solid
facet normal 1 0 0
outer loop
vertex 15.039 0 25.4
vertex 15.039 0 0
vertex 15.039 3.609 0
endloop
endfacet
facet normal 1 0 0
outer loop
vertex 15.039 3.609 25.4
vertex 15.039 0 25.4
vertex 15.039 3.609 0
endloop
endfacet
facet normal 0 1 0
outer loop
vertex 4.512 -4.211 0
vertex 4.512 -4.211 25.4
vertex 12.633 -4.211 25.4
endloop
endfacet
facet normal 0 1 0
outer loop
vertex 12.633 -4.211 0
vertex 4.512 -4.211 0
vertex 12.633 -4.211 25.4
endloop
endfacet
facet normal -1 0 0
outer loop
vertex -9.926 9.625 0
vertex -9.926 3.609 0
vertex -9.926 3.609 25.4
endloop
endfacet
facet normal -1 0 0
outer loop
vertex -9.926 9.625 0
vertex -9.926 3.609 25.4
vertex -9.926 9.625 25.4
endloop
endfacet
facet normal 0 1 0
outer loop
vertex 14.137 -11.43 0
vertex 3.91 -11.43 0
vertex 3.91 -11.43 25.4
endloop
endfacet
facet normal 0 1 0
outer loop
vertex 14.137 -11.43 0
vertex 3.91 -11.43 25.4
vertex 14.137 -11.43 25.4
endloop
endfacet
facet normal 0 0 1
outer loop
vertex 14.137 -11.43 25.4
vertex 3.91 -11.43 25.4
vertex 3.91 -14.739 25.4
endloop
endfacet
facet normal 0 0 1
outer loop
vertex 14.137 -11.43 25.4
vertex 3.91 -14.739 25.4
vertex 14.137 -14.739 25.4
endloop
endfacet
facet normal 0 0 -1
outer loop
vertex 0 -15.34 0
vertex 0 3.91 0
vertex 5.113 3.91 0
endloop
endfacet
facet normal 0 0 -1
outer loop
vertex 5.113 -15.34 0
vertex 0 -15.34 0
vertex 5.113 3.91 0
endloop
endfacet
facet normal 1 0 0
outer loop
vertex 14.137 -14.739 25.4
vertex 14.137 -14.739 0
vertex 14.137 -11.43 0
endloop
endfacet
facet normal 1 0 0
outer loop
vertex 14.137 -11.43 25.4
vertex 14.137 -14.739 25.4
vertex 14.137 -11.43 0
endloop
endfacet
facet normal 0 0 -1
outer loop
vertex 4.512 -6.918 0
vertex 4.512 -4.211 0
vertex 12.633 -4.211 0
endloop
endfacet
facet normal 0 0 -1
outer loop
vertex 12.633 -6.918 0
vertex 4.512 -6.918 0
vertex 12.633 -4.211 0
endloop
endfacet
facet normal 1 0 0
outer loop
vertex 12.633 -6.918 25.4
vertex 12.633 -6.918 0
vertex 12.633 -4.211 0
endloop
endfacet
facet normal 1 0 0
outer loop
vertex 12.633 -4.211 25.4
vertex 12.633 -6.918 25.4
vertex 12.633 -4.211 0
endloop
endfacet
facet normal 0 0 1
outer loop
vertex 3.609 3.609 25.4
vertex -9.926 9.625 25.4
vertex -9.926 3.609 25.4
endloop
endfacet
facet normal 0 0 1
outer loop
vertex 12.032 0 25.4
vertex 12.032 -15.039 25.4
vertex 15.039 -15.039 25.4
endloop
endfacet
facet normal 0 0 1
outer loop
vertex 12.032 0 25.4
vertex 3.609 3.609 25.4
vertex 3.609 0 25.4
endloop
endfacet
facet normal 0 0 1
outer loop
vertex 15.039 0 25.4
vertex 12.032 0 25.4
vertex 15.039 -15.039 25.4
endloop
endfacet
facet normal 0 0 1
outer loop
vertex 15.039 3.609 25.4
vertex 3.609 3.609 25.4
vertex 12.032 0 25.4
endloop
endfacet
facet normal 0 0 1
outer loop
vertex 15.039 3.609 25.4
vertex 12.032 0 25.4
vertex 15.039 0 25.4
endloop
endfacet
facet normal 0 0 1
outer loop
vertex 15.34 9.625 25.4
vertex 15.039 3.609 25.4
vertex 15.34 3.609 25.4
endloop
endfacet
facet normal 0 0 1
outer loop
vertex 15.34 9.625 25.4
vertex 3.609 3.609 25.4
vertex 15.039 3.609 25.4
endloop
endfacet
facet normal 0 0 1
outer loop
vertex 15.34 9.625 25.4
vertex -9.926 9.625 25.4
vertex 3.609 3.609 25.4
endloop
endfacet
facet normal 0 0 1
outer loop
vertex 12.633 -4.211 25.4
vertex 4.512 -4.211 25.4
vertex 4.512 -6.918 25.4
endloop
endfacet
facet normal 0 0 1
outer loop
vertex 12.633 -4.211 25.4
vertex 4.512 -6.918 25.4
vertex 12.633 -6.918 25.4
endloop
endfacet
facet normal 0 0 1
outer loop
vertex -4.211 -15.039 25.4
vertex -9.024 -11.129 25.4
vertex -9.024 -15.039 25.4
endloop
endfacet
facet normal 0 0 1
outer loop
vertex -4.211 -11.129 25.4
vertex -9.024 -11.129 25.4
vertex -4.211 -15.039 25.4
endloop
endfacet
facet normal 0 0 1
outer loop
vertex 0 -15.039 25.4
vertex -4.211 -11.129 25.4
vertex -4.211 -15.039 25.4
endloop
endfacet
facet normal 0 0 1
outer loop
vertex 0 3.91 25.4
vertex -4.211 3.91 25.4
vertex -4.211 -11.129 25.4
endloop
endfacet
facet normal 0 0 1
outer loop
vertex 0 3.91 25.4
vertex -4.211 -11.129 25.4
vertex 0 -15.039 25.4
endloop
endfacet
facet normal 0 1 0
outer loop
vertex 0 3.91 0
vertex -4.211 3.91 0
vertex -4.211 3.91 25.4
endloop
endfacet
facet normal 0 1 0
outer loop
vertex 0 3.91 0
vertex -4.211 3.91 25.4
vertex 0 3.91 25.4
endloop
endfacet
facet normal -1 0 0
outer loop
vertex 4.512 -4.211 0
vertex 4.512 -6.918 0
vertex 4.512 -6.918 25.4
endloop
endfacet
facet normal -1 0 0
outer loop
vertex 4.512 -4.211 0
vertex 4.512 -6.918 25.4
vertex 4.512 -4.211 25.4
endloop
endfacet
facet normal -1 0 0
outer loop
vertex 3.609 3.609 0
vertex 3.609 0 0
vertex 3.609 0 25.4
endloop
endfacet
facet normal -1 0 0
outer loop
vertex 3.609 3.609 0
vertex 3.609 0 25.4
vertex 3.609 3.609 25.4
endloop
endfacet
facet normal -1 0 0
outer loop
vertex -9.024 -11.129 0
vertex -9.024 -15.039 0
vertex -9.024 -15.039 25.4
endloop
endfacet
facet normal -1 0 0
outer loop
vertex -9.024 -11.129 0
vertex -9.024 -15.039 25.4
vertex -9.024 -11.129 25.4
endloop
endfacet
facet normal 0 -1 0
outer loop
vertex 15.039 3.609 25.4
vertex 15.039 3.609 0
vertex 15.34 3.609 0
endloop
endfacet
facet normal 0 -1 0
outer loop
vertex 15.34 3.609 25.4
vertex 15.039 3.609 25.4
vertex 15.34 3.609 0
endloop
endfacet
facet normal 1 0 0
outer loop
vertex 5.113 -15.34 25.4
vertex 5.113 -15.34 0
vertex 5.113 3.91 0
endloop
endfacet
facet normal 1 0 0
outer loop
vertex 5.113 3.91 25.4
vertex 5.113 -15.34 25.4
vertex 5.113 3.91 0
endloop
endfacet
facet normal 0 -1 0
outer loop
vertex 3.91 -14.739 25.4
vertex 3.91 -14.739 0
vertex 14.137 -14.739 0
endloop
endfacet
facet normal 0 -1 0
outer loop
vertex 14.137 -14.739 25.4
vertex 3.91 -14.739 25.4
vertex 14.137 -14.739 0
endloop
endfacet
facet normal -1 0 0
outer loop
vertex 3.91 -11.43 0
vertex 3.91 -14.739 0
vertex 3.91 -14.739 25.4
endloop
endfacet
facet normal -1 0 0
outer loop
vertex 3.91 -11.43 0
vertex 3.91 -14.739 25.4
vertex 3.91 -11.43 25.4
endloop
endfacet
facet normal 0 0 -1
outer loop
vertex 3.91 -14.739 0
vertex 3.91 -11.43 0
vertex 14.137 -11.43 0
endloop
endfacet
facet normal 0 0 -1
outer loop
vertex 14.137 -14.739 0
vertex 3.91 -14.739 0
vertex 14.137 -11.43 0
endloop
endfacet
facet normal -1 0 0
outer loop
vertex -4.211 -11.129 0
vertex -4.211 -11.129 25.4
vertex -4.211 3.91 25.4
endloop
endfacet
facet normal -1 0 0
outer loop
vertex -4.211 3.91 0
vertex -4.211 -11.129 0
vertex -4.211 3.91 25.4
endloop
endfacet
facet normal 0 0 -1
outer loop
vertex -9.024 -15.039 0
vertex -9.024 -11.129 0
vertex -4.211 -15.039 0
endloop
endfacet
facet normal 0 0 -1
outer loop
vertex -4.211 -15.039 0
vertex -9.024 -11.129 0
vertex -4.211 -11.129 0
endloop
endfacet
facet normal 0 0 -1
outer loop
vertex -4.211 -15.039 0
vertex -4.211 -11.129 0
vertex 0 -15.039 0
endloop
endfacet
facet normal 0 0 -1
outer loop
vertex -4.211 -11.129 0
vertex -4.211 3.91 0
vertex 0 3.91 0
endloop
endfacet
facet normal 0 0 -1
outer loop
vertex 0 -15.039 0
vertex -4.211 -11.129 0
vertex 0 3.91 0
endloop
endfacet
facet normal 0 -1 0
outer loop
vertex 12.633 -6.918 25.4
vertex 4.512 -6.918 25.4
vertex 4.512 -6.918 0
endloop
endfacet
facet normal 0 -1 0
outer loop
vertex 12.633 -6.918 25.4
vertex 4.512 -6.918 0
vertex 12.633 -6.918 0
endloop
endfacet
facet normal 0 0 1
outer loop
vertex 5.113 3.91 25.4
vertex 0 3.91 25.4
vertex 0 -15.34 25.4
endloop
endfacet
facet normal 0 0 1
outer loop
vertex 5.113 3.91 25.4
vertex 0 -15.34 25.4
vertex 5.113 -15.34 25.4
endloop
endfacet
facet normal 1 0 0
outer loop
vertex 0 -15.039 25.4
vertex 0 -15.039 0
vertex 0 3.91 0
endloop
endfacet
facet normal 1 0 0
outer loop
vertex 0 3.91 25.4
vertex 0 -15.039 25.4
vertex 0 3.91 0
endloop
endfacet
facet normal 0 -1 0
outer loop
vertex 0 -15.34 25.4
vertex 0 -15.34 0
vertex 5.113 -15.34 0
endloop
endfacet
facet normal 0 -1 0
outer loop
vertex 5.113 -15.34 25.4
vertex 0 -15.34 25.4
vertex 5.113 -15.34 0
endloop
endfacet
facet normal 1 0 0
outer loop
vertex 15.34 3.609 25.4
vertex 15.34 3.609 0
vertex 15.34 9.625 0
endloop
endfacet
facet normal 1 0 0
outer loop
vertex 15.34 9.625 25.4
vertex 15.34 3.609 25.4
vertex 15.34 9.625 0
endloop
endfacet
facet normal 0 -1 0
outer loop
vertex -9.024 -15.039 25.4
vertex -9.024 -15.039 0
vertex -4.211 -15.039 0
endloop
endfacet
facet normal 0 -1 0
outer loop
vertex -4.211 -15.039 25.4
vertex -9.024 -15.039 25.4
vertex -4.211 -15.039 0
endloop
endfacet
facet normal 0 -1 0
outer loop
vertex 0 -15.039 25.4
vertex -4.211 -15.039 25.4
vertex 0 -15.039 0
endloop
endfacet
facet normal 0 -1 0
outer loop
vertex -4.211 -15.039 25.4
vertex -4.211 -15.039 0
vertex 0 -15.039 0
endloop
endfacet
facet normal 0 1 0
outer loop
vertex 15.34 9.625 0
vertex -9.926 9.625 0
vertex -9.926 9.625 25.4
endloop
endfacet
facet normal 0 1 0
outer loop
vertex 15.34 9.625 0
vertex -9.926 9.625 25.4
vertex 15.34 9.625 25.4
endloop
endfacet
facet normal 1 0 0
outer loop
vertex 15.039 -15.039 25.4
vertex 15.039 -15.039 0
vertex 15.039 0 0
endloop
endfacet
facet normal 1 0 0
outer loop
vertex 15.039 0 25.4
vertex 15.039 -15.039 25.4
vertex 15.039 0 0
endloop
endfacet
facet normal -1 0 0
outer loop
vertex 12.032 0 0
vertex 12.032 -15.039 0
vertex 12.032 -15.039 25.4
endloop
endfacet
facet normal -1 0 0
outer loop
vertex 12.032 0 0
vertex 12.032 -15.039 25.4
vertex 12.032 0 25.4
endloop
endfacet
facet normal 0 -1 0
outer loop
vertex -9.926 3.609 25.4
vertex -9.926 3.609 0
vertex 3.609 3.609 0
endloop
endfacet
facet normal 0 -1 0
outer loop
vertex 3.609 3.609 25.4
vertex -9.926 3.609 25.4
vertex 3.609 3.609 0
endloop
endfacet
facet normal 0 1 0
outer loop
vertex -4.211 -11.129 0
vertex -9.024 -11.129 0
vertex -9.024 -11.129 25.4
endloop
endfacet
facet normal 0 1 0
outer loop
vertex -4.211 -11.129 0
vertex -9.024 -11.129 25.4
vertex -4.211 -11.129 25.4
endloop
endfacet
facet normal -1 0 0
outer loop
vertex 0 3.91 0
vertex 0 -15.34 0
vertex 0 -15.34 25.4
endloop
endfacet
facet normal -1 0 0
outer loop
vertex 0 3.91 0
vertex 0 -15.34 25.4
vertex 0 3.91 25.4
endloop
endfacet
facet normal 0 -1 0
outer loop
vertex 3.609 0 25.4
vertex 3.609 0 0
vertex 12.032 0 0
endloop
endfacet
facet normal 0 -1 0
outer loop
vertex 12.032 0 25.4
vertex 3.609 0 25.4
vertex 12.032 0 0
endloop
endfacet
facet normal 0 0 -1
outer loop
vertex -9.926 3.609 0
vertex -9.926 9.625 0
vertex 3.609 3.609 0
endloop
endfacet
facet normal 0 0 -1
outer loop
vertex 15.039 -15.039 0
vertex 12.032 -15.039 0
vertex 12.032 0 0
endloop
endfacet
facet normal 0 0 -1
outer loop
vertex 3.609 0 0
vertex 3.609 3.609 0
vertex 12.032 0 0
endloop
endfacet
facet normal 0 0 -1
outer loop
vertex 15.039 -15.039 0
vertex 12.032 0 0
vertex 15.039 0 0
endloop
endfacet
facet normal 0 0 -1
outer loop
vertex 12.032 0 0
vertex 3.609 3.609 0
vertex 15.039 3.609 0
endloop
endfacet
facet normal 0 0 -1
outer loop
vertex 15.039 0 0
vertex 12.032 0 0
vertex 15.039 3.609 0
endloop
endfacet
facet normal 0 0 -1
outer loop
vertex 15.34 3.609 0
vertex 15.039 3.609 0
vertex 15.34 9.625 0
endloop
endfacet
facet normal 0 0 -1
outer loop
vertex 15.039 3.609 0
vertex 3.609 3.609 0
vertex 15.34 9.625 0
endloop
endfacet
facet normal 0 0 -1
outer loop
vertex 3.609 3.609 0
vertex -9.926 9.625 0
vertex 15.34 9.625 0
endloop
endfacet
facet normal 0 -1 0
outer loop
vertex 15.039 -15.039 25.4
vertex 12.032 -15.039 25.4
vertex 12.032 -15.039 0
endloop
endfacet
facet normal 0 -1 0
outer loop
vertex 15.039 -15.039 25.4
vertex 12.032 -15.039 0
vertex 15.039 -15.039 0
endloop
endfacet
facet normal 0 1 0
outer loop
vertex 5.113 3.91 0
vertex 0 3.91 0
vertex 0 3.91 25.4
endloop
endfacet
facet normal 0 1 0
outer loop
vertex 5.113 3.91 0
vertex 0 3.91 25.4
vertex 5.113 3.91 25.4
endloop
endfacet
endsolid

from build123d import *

# Parameters (mm, degrees)
F1_W      = 25.2663176507
F1_H      = 6.0157899279
F2_DEPTH  = 25.4
F3_W      = 4.2110527866
F3_H      = 18.949736841
F4_DEPTH  = 25.4
F5_W      = 9.0236850083
F5_H      = 3.9102621377
F6_DEPTH  = 25.4
F7_W      = 5.1134219393
F7_H      = 19.2505251616
F8_DEPTH  = 25.4
F9_W      = 11.4300006535
F9_H      = 3.6094735842
F10_DEPTH = 25.4
F11_W     = 3.0078934506
F11_H     = 18.3481578715
F12_DEPTH = 25.4
F13_W     = 8.1213139929
F13_H     = 2.70710513
F14_DEPTH = 25.4
F15_W     = 10.2268396877
F15_H     = 3.3086827025
F16_DEPTH = 25.4


with BuildPart() as f2:
    # F1 (on face) → F2 (new body)
    with BuildSketch(Plane.XY):
        with Locations((2.7071060613, 6.6173685482)):
            Rectangle(F1_W, F1_H)
    extrude(amount=F2_DEPTH)

    # F9 (on face) → F10 (join)
    with BuildSketch(Plane.XY):
        with Locations((9.3244753079, 1.8047367921)):
            Rectangle(F9_W, F9_H)
    extrude(amount=F10_DEPTH)

    # F11 (on face) → F12 (join)
    with BuildSketch(Plane.XY):
        with Locations((13.5355251841, -5.8653948363)):
            Rectangle(F11_W, F11_H)
    extrude(amount=F12_DEPTH)


with BuildPart() as f4:
    # F3 (on face) → F4 (new body)
    with BuildSketch(Plane.XY):
        with Locations((-2.1055263933, -5.5646053515)):
            Rectangle(F3_W, F3_H)
    extrude(amount=F4_DEPTH)

    # F5 (on face) → F6 (join)
    with BuildSketch(Plane.XY):
        with Locations((-4.5118425041, -13.0843427032)):
            Rectangle(F5_W, F5_H)
    extrude(amount=F6_DEPTH)


with BuildPart() as f8:
    # F7 (on face) → F8 (new body)
    with BuildSketch(Plane.XY):
        with Locations((2.5567109697, -5.7149995118)):
            Rectangle(F7_W, F7_H)
    extrude(amount=F8_DEPTH)


with BuildPart() as f14:
    # F13 (on face) → F14 (new body)
    with BuildSketch(Plane.XY):
        with Locations((8.5724999662, -5.5646053515)):
            Rectangle(F13_W, F13_H)
    extrude(amount=F14_DEPTH)


with BuildPart() as f16:
    # F15 (on face) → F16 (new body)
    with BuildSketch(Plane.XY):
        with Locations((9.0236843098, -13.0843422376)):
            Rectangle(F15_W, F15_H)
    extrude(amount=F16_DEPTH)


solid = Compound([f2.part, f4.part, f8.part, f14.part, f16.part])
